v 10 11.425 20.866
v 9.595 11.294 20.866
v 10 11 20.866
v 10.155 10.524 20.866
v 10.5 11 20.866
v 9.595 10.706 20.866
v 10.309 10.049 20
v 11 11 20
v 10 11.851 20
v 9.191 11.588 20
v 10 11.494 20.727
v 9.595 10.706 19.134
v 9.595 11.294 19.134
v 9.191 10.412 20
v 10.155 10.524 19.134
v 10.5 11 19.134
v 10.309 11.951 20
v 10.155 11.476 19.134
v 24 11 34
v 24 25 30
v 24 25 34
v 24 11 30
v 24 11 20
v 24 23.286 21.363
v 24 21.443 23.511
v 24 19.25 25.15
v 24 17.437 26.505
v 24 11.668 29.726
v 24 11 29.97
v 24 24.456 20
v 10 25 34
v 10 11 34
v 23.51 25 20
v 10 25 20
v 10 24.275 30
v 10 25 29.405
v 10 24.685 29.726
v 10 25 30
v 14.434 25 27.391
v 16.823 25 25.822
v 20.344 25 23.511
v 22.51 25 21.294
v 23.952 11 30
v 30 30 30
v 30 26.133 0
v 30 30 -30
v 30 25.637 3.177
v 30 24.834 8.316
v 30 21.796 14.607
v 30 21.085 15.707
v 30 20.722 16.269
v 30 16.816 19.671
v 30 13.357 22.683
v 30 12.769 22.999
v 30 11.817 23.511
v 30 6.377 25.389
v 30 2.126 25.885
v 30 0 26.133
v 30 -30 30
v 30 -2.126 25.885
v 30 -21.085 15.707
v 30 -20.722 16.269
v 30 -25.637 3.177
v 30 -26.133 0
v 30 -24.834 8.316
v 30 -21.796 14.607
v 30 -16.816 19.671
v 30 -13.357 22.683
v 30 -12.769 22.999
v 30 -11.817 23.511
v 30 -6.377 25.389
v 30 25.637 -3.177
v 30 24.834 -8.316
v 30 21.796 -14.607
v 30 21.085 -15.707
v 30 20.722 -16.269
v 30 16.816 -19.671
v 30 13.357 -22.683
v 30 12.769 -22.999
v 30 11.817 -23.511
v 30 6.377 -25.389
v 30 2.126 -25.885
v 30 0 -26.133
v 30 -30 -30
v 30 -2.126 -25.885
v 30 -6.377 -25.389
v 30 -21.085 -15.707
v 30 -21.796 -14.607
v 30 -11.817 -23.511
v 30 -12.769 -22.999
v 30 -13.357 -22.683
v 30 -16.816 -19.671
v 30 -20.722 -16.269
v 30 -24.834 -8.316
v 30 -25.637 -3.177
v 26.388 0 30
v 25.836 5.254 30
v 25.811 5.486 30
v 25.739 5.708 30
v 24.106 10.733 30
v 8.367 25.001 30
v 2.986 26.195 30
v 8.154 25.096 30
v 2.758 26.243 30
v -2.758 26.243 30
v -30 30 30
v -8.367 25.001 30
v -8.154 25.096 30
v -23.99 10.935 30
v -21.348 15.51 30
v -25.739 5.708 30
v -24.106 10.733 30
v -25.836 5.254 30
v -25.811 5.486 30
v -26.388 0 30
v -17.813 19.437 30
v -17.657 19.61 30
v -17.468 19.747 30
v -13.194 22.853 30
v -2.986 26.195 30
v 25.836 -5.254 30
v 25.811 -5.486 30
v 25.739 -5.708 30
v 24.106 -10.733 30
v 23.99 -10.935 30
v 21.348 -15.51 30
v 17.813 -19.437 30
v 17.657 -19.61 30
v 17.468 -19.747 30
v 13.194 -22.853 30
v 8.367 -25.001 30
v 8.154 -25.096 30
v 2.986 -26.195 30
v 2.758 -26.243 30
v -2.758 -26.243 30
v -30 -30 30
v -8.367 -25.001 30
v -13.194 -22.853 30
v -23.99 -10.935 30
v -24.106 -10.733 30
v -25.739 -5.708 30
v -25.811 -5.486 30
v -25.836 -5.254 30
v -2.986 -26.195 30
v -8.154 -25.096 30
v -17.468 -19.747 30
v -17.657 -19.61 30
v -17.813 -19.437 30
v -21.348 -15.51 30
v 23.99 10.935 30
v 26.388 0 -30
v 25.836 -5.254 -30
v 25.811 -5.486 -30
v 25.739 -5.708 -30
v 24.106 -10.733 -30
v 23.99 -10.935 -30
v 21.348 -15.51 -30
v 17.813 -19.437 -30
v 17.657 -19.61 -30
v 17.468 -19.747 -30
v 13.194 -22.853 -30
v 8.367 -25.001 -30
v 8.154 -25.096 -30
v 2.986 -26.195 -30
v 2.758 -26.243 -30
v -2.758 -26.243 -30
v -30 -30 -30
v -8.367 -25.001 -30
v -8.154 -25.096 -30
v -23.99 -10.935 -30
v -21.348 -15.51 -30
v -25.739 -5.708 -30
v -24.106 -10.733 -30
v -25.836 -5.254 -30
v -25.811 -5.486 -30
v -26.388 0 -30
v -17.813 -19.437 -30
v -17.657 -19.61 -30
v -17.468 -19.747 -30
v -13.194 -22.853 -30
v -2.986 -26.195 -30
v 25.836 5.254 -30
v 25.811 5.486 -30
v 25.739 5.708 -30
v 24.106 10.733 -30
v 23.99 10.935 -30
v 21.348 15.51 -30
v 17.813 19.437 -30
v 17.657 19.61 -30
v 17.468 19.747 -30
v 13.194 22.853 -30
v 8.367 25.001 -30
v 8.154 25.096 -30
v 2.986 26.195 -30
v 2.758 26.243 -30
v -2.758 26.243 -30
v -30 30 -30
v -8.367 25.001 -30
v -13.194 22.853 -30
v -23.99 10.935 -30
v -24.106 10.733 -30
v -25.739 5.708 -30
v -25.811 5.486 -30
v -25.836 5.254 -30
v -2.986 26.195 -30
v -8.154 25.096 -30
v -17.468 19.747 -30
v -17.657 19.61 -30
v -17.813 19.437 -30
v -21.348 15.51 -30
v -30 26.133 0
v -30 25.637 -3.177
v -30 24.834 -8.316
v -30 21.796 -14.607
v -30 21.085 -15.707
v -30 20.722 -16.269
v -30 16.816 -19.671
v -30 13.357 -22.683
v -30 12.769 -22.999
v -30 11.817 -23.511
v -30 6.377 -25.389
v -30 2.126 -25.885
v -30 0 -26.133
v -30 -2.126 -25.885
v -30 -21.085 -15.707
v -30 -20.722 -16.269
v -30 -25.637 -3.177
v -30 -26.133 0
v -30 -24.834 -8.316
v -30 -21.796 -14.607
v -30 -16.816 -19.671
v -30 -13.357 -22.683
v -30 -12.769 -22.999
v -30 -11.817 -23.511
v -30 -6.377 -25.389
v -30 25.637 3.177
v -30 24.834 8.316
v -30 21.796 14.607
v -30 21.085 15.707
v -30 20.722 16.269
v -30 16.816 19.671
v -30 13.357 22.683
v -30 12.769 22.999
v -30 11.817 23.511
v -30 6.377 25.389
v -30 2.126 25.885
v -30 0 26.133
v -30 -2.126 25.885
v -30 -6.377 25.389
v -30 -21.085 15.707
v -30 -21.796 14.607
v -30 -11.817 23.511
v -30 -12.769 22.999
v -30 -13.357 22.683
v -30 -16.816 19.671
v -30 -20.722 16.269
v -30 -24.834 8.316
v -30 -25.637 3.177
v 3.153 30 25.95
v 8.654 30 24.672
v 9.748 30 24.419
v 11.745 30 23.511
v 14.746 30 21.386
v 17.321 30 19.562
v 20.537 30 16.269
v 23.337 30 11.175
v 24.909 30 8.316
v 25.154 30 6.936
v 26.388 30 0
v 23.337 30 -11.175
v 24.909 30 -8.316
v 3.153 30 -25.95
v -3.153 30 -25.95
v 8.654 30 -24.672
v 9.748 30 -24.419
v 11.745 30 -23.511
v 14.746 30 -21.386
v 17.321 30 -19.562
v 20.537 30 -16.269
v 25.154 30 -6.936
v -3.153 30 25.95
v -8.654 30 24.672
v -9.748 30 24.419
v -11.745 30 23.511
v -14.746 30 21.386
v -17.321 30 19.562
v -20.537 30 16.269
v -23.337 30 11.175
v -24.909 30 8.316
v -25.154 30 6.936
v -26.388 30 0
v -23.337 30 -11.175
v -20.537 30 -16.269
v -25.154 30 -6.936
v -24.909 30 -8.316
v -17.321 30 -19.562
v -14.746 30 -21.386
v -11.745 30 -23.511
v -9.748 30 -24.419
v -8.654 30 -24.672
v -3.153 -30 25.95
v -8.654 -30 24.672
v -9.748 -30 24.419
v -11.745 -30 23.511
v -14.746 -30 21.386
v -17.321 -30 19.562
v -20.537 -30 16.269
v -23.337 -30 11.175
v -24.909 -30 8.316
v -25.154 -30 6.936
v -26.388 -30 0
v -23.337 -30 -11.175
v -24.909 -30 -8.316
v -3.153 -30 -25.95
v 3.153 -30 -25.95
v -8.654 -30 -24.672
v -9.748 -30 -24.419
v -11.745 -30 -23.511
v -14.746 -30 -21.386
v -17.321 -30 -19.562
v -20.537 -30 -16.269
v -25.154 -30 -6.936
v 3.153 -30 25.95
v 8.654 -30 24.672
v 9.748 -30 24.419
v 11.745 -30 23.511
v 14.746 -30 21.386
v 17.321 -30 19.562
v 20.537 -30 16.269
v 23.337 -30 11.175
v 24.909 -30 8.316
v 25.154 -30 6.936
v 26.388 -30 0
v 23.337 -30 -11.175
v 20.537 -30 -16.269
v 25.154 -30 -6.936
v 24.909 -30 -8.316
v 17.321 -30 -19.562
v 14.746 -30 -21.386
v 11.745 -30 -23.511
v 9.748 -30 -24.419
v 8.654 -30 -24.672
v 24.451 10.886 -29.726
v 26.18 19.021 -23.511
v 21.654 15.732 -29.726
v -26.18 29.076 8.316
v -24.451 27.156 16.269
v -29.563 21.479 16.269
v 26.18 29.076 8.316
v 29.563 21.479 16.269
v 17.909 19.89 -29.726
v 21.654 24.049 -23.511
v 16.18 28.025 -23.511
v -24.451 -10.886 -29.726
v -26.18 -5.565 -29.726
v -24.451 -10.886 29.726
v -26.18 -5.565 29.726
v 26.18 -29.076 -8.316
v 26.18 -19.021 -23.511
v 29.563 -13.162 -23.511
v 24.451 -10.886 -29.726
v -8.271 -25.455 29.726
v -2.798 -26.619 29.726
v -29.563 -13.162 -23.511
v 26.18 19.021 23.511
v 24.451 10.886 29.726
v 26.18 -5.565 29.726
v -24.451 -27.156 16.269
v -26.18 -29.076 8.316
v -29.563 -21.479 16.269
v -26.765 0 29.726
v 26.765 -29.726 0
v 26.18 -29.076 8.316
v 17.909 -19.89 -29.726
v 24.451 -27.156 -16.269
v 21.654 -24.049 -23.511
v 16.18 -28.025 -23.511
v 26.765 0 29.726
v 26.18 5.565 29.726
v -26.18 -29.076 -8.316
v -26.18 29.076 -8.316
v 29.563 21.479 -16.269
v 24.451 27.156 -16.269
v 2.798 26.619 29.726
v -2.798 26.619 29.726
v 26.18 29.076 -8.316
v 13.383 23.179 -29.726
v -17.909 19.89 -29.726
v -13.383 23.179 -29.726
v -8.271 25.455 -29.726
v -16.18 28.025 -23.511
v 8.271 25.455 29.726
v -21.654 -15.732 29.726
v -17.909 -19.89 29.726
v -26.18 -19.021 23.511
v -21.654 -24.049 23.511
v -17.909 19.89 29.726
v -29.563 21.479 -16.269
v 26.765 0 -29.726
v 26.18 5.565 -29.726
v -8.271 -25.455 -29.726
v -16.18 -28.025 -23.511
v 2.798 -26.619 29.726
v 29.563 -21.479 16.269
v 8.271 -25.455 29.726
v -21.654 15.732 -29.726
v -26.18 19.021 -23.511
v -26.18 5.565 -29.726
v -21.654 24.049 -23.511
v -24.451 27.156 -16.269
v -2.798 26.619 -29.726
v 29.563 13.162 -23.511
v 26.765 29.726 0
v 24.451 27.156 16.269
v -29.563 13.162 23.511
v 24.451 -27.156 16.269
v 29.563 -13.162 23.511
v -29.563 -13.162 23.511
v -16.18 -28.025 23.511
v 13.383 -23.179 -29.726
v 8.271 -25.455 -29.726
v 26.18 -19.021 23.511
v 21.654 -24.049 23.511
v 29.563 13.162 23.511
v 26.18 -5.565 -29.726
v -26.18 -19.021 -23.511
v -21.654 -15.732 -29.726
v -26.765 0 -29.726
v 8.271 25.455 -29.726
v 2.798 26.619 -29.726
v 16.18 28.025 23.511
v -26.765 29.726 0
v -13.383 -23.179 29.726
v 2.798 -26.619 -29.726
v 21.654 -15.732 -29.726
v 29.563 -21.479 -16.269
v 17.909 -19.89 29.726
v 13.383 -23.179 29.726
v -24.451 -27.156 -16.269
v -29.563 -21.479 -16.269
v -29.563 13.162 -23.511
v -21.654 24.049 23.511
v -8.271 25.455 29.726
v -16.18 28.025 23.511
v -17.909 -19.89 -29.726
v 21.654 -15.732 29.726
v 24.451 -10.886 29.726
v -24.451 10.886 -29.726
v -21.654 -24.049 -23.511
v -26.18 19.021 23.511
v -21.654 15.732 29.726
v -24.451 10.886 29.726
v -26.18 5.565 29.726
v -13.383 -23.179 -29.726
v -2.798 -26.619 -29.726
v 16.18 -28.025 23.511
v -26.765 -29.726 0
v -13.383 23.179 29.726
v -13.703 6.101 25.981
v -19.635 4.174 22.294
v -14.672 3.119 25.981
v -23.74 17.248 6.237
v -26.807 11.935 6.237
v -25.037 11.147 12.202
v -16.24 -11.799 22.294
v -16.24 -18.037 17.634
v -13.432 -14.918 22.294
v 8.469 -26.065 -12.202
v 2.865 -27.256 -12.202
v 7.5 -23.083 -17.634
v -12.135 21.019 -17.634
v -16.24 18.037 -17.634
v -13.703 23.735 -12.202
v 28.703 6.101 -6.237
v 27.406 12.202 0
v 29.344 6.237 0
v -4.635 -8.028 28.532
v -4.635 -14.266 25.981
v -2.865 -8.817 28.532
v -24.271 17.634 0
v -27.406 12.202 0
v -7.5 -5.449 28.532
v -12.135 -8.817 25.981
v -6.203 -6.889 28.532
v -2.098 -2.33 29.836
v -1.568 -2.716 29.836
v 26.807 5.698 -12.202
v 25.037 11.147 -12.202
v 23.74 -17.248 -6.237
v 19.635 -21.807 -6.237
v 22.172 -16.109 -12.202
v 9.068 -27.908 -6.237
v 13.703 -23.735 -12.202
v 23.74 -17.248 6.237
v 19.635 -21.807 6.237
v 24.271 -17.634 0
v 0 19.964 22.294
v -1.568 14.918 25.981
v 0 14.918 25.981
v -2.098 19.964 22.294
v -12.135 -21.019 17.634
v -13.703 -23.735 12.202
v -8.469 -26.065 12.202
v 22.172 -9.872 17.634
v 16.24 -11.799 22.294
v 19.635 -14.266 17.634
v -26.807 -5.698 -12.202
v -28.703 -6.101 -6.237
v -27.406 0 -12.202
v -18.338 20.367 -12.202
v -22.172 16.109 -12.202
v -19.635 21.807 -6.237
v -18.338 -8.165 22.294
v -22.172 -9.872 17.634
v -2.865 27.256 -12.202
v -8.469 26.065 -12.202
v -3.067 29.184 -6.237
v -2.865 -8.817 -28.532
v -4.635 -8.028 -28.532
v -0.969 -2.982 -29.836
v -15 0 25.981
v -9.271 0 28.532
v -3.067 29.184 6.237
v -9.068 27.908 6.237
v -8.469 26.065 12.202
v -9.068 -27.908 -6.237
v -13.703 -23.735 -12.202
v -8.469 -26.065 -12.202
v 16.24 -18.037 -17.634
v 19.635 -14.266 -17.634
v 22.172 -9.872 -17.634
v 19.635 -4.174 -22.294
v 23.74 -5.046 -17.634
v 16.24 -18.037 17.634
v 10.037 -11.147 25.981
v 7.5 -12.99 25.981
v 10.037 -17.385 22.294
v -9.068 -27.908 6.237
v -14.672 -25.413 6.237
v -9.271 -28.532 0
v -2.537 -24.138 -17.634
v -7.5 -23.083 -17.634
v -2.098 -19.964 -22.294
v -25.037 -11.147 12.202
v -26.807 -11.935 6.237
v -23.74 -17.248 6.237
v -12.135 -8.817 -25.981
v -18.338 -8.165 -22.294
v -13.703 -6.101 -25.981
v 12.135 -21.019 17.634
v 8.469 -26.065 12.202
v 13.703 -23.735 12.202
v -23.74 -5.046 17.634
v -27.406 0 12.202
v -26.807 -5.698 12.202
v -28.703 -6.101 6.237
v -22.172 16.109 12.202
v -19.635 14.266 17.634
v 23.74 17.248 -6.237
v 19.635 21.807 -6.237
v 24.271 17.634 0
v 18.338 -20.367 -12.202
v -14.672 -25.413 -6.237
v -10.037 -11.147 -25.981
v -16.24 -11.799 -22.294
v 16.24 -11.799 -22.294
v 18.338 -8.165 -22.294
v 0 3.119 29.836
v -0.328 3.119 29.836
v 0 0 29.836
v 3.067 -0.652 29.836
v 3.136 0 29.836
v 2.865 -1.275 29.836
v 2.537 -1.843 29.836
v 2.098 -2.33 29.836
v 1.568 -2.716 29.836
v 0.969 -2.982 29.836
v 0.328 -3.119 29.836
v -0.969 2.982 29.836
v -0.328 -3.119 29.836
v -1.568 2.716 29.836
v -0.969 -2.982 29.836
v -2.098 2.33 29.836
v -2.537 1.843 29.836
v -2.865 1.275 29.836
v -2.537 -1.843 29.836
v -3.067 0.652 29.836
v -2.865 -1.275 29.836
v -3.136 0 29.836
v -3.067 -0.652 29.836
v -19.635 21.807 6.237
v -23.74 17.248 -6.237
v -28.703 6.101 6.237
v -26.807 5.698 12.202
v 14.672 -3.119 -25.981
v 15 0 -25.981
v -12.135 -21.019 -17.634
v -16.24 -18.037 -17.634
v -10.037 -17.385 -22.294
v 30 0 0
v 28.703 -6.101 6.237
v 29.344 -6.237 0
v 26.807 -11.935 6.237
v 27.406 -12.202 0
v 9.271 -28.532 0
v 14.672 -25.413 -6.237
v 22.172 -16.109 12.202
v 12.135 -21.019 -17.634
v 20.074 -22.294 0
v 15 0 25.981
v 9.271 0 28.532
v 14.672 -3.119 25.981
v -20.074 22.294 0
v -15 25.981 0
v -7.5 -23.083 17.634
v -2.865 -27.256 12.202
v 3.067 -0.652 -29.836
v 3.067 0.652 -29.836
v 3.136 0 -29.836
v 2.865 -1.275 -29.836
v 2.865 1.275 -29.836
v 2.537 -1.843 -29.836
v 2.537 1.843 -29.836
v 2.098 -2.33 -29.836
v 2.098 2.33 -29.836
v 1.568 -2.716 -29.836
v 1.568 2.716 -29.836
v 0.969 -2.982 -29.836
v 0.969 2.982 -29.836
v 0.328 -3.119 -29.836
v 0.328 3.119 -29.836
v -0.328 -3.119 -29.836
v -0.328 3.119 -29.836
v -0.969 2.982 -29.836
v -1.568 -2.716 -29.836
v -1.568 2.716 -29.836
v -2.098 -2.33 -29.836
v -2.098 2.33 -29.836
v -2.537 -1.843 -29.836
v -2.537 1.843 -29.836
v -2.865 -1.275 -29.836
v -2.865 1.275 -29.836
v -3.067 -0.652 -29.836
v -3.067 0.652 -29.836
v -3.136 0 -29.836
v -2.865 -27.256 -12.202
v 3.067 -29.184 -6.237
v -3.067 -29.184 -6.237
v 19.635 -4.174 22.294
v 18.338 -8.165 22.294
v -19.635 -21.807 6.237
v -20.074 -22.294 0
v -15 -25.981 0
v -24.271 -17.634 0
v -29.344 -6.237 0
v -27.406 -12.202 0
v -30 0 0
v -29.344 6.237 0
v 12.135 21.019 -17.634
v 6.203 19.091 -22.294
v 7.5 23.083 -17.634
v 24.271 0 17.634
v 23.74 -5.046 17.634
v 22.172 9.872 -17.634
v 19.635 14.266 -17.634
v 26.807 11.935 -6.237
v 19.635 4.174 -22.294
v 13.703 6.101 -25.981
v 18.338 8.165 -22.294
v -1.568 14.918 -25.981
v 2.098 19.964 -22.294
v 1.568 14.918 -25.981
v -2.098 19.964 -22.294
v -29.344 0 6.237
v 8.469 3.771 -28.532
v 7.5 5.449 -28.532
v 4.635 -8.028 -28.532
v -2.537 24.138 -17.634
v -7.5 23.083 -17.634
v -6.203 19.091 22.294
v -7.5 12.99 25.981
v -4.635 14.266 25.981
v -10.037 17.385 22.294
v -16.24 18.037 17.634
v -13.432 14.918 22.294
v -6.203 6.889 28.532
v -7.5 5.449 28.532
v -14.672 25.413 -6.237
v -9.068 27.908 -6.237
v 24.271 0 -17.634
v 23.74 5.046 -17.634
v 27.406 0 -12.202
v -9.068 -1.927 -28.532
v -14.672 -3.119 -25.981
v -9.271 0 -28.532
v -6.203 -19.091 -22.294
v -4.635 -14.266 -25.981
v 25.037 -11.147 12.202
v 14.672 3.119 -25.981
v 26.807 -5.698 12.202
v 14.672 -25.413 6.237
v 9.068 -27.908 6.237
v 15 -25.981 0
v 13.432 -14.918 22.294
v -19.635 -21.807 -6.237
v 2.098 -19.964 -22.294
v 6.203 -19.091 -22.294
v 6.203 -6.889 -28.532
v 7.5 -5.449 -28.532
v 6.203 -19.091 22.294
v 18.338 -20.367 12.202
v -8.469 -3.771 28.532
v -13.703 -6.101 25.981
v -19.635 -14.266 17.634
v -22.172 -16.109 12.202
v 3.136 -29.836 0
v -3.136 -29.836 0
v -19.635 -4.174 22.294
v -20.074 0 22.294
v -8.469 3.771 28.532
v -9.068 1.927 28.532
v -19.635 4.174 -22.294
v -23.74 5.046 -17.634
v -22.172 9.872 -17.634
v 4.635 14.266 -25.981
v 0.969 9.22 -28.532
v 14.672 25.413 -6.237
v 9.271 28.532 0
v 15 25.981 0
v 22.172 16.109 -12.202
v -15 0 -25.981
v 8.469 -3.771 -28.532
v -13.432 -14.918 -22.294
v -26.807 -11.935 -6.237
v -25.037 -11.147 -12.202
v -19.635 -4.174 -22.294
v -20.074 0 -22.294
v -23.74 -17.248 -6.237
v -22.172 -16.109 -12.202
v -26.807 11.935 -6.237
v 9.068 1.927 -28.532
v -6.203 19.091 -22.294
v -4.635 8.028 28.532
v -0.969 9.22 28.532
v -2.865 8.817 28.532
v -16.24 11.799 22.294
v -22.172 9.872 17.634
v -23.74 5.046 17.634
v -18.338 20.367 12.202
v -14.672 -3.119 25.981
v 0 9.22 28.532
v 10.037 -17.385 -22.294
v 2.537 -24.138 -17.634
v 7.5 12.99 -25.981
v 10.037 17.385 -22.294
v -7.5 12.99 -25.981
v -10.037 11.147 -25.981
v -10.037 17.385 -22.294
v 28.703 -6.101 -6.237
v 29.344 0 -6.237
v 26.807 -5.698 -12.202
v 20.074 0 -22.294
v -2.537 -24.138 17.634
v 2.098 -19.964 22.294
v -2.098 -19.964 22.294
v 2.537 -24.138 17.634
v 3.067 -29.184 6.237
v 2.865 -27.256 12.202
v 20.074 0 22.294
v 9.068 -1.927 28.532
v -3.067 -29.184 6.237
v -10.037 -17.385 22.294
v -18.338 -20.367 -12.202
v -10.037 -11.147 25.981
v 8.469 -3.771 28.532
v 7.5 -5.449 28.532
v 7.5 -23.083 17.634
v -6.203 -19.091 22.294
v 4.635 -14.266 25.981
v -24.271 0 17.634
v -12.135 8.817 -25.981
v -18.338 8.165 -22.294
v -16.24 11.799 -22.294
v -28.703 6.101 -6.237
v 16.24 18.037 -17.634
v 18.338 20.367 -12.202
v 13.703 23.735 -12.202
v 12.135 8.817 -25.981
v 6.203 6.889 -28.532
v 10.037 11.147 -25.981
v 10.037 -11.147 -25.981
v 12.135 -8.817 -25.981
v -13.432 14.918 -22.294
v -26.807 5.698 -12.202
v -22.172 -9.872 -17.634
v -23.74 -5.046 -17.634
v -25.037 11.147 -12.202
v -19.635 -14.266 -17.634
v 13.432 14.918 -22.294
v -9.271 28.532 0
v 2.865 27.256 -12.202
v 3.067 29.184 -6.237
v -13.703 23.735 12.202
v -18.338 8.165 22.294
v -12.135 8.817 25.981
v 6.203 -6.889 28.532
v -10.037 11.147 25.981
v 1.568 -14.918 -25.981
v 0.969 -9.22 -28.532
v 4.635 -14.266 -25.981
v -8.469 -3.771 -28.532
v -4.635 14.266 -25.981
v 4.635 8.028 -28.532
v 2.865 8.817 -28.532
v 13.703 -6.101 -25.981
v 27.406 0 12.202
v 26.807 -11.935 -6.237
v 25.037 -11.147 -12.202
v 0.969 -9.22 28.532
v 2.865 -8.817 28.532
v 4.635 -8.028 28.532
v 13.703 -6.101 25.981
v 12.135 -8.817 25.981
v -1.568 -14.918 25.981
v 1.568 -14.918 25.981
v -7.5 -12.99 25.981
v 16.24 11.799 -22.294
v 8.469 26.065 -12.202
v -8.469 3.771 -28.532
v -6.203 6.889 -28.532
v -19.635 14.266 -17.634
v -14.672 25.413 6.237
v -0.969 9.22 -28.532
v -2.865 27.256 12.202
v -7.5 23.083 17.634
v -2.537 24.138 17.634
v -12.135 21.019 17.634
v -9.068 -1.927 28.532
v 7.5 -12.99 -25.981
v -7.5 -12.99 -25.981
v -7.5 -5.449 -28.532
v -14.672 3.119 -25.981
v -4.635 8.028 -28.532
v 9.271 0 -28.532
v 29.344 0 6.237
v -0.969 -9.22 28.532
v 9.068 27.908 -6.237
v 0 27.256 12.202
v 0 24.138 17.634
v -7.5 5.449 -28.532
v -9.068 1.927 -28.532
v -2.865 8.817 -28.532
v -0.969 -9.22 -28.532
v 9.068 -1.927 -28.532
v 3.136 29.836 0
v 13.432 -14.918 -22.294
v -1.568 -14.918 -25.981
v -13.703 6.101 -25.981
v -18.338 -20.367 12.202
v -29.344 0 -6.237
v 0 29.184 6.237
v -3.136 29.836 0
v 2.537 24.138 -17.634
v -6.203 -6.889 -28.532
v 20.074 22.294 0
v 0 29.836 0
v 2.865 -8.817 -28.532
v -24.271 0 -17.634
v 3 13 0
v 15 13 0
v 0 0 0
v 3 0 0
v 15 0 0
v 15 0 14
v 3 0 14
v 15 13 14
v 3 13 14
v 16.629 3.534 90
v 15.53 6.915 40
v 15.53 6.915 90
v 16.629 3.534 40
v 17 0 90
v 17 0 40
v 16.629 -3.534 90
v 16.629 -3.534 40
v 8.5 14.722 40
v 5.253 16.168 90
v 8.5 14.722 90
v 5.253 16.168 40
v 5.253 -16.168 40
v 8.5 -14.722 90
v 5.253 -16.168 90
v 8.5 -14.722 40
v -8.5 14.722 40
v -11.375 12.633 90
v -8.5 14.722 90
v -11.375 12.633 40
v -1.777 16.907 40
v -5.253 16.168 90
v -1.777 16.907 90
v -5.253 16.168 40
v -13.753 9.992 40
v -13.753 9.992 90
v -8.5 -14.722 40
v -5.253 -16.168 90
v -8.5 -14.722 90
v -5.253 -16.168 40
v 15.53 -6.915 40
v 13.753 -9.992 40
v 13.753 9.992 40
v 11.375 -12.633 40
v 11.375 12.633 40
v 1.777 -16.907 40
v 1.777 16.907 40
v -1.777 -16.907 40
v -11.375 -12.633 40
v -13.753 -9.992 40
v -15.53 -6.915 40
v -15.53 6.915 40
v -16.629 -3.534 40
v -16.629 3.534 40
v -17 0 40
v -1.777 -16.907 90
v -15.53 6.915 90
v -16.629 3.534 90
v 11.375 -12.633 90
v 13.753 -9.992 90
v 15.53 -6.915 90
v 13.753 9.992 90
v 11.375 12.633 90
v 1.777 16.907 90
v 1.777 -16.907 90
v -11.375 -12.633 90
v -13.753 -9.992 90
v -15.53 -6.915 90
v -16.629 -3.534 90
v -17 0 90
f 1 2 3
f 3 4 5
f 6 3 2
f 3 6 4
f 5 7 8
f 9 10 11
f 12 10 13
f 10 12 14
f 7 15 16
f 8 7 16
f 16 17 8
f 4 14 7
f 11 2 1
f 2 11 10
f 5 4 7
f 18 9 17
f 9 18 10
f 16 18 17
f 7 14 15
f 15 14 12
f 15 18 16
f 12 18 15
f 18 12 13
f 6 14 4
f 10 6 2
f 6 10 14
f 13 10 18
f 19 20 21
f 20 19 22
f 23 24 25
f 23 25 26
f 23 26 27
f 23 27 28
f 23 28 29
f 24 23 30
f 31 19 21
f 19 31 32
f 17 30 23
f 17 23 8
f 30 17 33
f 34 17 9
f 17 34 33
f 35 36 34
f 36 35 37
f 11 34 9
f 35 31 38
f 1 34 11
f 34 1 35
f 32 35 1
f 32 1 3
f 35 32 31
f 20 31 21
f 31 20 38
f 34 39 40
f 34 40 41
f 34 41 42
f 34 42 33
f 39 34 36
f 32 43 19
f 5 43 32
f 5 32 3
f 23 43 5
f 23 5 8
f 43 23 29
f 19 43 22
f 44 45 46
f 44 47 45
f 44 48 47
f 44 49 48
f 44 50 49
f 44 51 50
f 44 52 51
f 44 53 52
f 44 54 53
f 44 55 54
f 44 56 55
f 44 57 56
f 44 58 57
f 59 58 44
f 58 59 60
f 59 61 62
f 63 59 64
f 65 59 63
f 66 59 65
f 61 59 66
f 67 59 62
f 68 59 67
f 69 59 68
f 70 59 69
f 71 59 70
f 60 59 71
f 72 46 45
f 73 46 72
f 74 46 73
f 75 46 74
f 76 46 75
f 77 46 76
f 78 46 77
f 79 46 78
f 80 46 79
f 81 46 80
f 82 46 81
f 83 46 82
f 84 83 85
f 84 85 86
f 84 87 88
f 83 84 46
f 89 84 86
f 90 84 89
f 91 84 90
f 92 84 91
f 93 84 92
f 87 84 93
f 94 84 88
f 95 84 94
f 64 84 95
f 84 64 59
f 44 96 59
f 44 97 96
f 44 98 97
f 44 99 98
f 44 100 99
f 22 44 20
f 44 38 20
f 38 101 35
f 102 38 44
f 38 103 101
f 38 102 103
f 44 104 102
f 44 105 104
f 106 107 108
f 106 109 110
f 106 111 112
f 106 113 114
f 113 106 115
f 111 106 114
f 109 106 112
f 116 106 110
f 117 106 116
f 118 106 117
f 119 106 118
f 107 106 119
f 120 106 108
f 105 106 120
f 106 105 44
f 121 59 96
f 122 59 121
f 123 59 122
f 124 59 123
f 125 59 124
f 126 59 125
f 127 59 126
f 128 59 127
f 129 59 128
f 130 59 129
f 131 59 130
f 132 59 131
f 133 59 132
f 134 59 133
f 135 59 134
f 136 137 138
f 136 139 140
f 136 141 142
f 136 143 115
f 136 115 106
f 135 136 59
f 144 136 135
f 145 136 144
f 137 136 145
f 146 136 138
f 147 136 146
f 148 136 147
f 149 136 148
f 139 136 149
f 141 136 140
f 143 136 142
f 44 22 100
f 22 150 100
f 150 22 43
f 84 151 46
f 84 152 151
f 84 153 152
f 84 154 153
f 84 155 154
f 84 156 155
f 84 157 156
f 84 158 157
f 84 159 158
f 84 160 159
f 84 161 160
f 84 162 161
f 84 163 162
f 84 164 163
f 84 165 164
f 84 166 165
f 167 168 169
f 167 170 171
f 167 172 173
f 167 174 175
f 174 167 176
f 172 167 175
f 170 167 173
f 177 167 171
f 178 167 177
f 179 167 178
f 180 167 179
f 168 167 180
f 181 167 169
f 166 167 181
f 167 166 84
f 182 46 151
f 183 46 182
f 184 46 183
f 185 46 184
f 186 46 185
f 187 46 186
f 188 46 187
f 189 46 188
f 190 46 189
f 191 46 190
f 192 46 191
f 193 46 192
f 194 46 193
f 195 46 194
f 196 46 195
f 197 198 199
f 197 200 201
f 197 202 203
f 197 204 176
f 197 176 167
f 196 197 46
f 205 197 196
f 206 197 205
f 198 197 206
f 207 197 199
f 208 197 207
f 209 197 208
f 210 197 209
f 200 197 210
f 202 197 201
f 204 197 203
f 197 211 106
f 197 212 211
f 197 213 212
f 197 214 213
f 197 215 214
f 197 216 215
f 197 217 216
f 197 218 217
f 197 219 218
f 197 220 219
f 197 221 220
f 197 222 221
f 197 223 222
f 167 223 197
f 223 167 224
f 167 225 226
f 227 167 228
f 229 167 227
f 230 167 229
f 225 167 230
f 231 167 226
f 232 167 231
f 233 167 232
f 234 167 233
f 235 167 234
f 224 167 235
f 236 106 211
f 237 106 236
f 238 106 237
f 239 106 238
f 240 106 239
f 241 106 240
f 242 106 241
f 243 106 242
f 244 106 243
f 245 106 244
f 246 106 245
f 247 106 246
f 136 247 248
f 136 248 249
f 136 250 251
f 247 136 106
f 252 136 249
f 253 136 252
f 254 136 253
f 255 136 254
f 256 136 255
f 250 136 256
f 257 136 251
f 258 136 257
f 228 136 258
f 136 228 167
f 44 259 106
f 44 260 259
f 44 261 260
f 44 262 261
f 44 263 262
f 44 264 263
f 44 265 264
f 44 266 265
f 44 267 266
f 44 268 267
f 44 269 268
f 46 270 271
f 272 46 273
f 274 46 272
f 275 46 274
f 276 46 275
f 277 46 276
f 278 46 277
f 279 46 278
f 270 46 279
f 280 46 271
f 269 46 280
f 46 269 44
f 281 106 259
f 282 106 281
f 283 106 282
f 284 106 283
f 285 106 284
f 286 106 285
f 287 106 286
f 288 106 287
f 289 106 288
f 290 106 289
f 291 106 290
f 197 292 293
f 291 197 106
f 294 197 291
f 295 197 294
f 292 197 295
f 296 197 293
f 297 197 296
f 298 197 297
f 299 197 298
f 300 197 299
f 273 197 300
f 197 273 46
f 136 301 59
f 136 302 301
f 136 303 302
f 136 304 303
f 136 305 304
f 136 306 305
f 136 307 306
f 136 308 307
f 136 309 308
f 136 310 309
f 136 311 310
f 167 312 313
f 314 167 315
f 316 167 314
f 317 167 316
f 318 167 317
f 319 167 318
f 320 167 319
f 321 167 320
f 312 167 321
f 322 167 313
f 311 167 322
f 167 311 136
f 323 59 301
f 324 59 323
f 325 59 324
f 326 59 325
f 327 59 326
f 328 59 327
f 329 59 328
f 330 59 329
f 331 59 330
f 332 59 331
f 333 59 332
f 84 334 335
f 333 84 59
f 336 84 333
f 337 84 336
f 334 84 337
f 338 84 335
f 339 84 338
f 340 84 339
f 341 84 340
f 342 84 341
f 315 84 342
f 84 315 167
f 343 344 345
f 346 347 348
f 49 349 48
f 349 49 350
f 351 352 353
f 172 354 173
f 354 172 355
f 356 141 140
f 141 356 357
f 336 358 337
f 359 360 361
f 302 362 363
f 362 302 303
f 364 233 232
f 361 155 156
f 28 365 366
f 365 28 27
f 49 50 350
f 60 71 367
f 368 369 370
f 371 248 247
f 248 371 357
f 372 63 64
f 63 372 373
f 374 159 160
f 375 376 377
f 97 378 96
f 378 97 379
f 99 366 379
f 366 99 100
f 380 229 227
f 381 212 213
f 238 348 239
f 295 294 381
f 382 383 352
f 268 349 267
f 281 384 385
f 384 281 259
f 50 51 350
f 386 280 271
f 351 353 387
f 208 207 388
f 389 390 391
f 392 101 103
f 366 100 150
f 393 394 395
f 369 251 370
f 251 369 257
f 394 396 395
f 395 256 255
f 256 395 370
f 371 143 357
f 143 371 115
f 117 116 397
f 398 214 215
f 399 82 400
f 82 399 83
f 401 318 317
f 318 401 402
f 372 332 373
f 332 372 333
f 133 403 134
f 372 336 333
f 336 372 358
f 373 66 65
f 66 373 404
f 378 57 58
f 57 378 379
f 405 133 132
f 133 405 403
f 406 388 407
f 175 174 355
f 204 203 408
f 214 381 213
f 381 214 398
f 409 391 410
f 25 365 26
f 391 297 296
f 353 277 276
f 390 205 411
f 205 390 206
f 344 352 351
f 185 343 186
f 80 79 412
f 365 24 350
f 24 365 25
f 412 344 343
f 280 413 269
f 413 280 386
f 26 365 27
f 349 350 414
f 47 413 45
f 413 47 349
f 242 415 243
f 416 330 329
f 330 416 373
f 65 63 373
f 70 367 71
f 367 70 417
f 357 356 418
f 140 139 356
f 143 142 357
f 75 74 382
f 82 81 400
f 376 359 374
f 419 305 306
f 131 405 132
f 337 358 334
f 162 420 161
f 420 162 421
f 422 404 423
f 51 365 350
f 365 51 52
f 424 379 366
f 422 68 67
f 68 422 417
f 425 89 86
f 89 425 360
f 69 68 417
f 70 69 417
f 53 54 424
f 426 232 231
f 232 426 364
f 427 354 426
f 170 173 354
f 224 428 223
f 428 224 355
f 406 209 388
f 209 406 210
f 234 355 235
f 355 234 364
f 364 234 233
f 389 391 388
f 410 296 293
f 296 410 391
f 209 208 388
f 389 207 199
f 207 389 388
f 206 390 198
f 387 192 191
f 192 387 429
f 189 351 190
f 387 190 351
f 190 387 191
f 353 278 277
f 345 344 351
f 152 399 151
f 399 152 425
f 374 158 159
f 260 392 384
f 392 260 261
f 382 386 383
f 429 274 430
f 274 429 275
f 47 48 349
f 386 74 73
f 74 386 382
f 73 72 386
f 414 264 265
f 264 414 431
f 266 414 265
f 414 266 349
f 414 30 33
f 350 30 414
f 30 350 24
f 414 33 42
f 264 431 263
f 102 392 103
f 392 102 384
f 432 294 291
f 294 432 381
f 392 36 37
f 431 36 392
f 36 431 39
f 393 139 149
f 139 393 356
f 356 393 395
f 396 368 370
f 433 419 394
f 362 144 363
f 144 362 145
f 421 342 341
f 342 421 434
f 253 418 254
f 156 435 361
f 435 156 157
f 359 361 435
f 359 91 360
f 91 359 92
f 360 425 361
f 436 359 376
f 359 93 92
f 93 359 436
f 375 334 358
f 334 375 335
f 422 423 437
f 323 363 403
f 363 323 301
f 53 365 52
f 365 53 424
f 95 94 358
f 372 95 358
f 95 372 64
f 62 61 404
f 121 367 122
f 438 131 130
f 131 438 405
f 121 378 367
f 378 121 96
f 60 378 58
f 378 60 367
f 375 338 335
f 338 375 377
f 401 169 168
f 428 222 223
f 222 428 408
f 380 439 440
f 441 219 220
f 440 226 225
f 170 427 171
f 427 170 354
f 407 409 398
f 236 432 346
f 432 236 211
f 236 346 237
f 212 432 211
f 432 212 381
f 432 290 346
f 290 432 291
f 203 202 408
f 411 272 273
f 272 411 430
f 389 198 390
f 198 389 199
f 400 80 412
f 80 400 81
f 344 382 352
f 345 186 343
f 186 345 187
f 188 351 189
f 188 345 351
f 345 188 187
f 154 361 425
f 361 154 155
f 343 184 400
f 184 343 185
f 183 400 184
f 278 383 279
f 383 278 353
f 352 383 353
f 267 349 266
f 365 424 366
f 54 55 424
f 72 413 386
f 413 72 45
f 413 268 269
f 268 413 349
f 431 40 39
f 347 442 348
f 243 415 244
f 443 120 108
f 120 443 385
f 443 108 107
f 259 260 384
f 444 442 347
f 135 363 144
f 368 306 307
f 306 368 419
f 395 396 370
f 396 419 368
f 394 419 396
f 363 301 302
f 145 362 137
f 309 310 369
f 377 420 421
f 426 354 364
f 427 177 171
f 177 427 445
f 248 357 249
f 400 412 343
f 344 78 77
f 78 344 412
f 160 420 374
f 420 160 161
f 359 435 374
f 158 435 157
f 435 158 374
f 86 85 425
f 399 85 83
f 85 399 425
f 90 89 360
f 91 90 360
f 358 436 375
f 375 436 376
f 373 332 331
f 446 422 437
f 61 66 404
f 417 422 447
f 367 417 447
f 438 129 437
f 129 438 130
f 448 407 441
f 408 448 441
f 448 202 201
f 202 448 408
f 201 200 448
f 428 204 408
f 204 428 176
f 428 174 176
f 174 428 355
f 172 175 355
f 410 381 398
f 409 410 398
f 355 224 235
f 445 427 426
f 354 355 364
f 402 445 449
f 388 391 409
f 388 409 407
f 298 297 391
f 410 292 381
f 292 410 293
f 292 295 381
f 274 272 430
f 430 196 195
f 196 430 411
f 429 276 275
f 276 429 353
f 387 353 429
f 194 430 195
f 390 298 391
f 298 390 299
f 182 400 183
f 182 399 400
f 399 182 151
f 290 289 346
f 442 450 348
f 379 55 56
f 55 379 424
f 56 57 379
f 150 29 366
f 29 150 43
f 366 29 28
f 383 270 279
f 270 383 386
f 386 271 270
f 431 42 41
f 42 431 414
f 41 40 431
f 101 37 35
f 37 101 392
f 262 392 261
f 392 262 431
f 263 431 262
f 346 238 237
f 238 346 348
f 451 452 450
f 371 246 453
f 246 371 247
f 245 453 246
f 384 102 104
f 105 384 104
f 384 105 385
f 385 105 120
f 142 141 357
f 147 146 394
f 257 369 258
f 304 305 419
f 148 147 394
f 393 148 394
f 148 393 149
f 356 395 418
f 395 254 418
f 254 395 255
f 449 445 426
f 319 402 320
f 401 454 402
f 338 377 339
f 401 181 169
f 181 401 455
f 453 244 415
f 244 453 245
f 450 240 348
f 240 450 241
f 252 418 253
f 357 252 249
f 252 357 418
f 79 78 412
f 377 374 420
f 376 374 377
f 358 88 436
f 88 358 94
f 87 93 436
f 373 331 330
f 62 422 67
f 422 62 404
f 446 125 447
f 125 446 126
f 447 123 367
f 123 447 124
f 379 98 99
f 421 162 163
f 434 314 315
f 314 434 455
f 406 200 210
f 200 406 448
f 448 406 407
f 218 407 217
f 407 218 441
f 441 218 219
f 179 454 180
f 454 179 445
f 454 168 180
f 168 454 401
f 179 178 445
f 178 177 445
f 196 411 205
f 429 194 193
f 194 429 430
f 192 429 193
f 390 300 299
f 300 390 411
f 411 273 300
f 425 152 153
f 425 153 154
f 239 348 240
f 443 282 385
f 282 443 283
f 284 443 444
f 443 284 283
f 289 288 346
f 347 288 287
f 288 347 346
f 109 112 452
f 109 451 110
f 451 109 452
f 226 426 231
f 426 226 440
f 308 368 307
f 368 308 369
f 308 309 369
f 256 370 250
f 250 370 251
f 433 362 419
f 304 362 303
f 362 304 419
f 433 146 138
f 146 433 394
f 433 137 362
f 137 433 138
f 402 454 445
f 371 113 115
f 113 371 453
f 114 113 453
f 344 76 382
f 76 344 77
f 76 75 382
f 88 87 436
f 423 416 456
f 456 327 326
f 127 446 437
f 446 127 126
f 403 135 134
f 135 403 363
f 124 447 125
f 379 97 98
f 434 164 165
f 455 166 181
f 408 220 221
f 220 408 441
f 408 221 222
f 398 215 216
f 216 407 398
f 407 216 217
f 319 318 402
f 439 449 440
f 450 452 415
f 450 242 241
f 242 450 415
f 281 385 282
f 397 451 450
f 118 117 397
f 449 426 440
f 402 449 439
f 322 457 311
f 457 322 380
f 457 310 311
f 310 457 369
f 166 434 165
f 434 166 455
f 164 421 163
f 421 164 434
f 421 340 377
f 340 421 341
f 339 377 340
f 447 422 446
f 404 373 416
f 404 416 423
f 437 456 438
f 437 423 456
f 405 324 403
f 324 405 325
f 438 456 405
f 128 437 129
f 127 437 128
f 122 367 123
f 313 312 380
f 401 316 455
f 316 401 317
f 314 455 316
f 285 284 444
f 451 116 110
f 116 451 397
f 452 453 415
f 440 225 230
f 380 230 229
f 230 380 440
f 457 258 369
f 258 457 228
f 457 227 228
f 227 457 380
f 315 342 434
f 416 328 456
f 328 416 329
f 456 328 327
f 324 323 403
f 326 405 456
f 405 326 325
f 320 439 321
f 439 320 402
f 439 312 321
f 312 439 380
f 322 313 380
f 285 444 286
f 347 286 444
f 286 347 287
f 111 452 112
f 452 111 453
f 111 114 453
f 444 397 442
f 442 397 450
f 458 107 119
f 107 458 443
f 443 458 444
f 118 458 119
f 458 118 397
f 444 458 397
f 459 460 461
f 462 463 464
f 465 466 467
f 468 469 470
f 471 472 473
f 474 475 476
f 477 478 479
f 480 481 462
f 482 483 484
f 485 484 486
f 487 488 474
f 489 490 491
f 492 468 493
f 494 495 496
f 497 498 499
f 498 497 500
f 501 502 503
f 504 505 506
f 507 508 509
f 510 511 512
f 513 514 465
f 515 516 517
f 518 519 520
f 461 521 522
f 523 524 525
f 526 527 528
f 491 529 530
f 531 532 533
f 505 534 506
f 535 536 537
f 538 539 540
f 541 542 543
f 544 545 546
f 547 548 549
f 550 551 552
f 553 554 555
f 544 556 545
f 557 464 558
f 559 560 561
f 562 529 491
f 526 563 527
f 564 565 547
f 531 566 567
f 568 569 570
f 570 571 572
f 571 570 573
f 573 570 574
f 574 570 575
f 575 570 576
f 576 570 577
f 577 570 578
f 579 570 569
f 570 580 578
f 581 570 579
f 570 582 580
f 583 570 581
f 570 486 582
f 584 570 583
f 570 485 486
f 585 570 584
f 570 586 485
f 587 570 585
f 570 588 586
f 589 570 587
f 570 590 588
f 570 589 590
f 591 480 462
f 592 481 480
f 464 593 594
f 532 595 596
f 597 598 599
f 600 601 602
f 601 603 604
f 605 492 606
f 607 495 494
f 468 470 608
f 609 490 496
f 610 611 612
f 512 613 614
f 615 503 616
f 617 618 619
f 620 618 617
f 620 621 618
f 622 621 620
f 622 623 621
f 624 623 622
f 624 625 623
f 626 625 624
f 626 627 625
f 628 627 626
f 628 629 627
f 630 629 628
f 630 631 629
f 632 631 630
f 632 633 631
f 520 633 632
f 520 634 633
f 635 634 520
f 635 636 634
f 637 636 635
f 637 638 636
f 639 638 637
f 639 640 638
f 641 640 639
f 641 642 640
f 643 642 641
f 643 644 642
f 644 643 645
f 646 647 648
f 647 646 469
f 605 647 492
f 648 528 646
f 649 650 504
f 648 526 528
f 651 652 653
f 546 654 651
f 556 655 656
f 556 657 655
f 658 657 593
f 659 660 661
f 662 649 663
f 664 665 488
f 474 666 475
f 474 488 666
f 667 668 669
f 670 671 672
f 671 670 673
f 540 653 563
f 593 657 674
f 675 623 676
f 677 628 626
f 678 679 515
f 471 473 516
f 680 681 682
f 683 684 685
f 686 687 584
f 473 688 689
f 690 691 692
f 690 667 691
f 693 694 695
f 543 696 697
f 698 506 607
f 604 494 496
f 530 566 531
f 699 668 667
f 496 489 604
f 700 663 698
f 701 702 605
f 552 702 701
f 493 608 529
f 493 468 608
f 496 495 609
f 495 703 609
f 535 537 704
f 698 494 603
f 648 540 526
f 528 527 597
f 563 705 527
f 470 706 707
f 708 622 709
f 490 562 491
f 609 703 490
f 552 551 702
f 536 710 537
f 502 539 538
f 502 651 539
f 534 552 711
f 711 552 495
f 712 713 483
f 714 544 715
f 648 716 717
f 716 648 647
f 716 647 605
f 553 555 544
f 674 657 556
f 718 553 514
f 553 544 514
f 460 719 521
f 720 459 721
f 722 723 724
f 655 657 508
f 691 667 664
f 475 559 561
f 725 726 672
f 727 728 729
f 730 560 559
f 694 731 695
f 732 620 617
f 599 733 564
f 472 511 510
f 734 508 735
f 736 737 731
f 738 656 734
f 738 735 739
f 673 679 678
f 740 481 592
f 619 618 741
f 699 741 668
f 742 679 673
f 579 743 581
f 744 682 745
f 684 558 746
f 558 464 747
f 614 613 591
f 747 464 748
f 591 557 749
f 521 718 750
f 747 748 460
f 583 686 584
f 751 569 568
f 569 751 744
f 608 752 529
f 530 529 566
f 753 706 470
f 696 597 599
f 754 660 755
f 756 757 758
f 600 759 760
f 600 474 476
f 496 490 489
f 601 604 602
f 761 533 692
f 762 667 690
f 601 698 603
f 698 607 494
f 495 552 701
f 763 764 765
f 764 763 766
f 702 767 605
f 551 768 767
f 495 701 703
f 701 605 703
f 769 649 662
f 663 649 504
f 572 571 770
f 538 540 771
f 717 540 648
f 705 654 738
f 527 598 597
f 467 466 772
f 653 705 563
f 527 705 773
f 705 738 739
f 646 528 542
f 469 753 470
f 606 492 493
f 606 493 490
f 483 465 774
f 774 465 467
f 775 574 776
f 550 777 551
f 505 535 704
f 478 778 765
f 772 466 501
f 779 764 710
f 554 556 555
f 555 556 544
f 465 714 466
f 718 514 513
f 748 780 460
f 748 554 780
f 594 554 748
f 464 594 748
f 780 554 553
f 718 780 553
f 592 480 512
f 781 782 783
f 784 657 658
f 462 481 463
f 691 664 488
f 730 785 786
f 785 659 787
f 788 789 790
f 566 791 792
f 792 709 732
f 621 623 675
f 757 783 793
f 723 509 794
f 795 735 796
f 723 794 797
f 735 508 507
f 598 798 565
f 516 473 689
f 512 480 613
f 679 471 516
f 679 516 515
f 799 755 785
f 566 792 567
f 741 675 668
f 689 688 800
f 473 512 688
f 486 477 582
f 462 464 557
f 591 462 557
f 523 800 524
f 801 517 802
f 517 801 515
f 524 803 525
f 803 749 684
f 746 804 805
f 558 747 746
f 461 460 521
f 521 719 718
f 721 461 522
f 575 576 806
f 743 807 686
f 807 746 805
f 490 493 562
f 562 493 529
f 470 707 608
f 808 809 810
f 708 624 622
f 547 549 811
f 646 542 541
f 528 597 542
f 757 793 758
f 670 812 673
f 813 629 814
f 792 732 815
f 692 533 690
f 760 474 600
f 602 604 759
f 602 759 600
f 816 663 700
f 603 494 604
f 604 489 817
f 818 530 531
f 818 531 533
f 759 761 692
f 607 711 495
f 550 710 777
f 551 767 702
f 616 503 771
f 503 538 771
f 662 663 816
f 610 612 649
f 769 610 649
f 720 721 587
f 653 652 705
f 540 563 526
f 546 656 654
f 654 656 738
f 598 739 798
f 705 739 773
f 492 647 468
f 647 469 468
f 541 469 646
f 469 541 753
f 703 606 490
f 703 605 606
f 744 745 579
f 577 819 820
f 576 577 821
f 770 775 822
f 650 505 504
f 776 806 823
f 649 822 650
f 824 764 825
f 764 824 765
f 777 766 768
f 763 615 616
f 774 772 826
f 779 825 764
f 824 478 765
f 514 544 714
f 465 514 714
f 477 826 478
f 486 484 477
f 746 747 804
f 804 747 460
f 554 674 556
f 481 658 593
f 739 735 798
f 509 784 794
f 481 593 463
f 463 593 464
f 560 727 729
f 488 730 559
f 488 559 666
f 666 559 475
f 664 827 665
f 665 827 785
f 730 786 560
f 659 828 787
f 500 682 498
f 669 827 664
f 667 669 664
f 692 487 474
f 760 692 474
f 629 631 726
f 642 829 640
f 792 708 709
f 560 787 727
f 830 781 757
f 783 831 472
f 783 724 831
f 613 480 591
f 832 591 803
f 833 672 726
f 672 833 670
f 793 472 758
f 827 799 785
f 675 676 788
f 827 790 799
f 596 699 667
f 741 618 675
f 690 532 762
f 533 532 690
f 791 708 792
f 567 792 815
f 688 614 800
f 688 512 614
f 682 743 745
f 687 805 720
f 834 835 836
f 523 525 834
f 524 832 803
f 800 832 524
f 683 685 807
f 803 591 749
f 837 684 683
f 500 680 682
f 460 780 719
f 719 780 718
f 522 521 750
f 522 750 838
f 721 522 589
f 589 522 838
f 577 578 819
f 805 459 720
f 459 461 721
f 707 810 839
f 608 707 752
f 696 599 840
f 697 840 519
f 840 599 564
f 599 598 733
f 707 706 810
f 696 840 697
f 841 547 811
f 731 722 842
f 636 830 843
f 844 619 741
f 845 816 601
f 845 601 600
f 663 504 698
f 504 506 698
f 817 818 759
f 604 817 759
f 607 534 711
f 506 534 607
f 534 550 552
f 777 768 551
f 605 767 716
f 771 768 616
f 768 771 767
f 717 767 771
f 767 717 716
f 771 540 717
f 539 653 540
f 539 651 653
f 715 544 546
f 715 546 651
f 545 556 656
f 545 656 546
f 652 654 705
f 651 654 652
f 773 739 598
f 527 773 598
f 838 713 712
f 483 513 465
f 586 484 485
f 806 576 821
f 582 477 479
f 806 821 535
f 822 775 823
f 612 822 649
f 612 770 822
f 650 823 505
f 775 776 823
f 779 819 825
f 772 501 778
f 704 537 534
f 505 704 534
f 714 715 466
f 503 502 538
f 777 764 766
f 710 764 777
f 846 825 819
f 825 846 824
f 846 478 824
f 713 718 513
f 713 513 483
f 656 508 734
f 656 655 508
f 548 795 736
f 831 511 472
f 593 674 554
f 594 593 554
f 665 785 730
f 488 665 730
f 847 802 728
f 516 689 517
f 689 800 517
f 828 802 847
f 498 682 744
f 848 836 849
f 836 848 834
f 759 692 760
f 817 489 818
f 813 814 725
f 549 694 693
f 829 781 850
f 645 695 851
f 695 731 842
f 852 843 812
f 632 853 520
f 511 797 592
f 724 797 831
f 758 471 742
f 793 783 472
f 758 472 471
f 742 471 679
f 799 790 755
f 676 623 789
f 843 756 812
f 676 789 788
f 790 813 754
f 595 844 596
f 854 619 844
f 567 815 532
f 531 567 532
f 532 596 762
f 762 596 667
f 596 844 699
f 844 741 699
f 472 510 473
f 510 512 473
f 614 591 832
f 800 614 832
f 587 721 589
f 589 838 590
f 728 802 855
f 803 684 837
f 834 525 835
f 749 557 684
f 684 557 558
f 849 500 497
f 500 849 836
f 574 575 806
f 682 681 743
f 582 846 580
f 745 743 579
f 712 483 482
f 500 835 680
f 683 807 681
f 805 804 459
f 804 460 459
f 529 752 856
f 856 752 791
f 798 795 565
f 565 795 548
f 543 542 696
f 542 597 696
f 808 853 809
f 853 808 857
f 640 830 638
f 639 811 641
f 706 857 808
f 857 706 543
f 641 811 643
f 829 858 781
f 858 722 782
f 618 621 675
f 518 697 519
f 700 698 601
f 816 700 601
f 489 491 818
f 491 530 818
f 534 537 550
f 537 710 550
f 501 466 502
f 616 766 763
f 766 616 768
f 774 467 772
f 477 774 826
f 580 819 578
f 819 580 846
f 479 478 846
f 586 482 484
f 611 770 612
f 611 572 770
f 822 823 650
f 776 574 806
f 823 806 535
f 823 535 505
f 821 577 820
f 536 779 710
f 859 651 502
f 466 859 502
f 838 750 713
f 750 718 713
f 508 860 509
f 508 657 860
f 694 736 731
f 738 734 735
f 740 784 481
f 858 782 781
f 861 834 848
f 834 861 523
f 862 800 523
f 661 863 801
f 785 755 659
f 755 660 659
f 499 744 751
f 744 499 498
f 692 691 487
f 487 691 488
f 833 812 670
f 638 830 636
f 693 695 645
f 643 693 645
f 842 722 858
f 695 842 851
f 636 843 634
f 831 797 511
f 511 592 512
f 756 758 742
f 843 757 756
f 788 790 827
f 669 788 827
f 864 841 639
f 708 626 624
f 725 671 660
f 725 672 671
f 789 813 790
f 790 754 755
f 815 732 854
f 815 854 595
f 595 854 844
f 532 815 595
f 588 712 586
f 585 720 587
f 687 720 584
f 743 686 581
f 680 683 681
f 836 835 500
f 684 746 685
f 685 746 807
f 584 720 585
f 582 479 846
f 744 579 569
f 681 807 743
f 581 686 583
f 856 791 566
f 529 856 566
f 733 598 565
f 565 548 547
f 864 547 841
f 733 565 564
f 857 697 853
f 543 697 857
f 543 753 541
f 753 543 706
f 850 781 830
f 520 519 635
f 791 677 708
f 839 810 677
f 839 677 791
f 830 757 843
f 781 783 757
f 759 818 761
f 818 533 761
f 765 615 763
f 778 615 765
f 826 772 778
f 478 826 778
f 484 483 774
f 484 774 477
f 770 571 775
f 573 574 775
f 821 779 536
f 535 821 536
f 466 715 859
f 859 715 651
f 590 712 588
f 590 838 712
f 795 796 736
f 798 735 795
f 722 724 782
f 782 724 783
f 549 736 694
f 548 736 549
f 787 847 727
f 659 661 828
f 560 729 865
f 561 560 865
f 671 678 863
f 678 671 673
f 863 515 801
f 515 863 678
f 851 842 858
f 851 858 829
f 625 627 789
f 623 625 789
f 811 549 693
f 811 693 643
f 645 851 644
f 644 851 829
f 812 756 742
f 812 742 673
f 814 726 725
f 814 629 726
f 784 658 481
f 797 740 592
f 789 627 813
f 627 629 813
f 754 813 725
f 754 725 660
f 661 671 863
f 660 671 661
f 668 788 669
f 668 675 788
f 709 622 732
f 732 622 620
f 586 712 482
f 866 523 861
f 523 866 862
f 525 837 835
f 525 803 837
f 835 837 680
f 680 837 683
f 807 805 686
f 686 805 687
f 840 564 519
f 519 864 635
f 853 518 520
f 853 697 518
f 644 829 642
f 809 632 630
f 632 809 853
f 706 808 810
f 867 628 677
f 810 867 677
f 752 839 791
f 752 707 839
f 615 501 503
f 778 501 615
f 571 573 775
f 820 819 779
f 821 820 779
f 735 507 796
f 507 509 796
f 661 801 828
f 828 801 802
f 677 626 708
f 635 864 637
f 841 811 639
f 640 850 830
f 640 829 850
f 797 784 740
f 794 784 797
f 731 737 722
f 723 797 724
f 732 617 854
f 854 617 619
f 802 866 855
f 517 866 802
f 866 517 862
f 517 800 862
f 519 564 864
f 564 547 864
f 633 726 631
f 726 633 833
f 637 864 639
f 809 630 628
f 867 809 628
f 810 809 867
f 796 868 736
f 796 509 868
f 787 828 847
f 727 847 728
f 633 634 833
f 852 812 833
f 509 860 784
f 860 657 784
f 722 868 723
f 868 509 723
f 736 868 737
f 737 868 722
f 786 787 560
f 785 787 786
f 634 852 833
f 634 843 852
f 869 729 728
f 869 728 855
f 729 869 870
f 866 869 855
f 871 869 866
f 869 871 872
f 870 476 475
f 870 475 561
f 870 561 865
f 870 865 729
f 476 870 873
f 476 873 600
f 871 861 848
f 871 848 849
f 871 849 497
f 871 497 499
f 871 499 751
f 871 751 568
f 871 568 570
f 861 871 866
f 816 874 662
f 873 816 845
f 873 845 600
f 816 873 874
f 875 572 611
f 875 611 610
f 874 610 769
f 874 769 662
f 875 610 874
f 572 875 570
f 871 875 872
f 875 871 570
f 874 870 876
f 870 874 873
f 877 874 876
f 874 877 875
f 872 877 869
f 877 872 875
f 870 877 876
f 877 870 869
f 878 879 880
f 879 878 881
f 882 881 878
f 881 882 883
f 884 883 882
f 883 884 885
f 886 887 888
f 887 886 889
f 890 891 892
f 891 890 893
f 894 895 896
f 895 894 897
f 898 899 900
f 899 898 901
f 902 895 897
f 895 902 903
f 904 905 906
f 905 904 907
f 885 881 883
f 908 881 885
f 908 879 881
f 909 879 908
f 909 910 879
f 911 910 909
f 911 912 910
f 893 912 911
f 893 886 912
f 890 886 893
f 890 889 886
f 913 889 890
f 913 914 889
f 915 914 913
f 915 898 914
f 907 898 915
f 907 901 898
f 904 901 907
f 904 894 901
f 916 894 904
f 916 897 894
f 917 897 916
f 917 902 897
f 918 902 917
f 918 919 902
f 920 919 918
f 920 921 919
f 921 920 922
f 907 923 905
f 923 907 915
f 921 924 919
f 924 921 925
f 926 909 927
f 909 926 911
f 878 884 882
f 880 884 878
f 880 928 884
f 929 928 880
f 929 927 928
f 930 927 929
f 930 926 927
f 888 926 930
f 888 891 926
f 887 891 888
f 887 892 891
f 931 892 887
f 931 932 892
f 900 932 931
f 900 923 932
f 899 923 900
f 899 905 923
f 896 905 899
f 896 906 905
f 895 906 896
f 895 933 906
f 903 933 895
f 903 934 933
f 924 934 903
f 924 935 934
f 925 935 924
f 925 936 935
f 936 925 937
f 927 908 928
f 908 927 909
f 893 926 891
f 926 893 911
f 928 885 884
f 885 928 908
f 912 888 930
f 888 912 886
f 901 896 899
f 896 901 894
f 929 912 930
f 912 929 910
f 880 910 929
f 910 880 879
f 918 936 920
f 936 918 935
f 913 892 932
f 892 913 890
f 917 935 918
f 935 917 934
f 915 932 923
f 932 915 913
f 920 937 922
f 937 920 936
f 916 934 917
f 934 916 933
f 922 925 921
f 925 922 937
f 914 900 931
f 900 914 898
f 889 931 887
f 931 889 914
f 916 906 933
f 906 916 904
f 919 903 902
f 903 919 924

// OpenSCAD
translate([10,11,20]){
color([1,0,0]) sphere([50,50,11]);
color([1,0,1]) cube(14,12,11);
}
translate([3,0,0]){
color([1,0,1]) cube([12,13,14]);
}

difference() {
   color([1,0,1])  cube(60, center=true);
   color([0,0,1])  sphere(40);
}
translate([0, 0, 40]) {
   color([0.7,0.2,0.4])  cylinder(h=50, r=17);
}

difference(){
   
 color([0.7,0.2,0.4]) sphere(30, center=true);
 color([0.1,0.4,0.7]) cube(30);
    
}


translate([-30,0,0]){


difference () {
  color([0.1,0.4,0.7]) polyhedron(
  points=[ [50,30,70],[30,-100,0],[-130,-30,10],[-30,40,0], [40,0,30]  ],                                
  triangles=[ [0,1,4],[1,2,4],[2,3,4],[3,10,4],        
              [1,10,3],[2,1,3] ]                         
 );   
    
}

}
